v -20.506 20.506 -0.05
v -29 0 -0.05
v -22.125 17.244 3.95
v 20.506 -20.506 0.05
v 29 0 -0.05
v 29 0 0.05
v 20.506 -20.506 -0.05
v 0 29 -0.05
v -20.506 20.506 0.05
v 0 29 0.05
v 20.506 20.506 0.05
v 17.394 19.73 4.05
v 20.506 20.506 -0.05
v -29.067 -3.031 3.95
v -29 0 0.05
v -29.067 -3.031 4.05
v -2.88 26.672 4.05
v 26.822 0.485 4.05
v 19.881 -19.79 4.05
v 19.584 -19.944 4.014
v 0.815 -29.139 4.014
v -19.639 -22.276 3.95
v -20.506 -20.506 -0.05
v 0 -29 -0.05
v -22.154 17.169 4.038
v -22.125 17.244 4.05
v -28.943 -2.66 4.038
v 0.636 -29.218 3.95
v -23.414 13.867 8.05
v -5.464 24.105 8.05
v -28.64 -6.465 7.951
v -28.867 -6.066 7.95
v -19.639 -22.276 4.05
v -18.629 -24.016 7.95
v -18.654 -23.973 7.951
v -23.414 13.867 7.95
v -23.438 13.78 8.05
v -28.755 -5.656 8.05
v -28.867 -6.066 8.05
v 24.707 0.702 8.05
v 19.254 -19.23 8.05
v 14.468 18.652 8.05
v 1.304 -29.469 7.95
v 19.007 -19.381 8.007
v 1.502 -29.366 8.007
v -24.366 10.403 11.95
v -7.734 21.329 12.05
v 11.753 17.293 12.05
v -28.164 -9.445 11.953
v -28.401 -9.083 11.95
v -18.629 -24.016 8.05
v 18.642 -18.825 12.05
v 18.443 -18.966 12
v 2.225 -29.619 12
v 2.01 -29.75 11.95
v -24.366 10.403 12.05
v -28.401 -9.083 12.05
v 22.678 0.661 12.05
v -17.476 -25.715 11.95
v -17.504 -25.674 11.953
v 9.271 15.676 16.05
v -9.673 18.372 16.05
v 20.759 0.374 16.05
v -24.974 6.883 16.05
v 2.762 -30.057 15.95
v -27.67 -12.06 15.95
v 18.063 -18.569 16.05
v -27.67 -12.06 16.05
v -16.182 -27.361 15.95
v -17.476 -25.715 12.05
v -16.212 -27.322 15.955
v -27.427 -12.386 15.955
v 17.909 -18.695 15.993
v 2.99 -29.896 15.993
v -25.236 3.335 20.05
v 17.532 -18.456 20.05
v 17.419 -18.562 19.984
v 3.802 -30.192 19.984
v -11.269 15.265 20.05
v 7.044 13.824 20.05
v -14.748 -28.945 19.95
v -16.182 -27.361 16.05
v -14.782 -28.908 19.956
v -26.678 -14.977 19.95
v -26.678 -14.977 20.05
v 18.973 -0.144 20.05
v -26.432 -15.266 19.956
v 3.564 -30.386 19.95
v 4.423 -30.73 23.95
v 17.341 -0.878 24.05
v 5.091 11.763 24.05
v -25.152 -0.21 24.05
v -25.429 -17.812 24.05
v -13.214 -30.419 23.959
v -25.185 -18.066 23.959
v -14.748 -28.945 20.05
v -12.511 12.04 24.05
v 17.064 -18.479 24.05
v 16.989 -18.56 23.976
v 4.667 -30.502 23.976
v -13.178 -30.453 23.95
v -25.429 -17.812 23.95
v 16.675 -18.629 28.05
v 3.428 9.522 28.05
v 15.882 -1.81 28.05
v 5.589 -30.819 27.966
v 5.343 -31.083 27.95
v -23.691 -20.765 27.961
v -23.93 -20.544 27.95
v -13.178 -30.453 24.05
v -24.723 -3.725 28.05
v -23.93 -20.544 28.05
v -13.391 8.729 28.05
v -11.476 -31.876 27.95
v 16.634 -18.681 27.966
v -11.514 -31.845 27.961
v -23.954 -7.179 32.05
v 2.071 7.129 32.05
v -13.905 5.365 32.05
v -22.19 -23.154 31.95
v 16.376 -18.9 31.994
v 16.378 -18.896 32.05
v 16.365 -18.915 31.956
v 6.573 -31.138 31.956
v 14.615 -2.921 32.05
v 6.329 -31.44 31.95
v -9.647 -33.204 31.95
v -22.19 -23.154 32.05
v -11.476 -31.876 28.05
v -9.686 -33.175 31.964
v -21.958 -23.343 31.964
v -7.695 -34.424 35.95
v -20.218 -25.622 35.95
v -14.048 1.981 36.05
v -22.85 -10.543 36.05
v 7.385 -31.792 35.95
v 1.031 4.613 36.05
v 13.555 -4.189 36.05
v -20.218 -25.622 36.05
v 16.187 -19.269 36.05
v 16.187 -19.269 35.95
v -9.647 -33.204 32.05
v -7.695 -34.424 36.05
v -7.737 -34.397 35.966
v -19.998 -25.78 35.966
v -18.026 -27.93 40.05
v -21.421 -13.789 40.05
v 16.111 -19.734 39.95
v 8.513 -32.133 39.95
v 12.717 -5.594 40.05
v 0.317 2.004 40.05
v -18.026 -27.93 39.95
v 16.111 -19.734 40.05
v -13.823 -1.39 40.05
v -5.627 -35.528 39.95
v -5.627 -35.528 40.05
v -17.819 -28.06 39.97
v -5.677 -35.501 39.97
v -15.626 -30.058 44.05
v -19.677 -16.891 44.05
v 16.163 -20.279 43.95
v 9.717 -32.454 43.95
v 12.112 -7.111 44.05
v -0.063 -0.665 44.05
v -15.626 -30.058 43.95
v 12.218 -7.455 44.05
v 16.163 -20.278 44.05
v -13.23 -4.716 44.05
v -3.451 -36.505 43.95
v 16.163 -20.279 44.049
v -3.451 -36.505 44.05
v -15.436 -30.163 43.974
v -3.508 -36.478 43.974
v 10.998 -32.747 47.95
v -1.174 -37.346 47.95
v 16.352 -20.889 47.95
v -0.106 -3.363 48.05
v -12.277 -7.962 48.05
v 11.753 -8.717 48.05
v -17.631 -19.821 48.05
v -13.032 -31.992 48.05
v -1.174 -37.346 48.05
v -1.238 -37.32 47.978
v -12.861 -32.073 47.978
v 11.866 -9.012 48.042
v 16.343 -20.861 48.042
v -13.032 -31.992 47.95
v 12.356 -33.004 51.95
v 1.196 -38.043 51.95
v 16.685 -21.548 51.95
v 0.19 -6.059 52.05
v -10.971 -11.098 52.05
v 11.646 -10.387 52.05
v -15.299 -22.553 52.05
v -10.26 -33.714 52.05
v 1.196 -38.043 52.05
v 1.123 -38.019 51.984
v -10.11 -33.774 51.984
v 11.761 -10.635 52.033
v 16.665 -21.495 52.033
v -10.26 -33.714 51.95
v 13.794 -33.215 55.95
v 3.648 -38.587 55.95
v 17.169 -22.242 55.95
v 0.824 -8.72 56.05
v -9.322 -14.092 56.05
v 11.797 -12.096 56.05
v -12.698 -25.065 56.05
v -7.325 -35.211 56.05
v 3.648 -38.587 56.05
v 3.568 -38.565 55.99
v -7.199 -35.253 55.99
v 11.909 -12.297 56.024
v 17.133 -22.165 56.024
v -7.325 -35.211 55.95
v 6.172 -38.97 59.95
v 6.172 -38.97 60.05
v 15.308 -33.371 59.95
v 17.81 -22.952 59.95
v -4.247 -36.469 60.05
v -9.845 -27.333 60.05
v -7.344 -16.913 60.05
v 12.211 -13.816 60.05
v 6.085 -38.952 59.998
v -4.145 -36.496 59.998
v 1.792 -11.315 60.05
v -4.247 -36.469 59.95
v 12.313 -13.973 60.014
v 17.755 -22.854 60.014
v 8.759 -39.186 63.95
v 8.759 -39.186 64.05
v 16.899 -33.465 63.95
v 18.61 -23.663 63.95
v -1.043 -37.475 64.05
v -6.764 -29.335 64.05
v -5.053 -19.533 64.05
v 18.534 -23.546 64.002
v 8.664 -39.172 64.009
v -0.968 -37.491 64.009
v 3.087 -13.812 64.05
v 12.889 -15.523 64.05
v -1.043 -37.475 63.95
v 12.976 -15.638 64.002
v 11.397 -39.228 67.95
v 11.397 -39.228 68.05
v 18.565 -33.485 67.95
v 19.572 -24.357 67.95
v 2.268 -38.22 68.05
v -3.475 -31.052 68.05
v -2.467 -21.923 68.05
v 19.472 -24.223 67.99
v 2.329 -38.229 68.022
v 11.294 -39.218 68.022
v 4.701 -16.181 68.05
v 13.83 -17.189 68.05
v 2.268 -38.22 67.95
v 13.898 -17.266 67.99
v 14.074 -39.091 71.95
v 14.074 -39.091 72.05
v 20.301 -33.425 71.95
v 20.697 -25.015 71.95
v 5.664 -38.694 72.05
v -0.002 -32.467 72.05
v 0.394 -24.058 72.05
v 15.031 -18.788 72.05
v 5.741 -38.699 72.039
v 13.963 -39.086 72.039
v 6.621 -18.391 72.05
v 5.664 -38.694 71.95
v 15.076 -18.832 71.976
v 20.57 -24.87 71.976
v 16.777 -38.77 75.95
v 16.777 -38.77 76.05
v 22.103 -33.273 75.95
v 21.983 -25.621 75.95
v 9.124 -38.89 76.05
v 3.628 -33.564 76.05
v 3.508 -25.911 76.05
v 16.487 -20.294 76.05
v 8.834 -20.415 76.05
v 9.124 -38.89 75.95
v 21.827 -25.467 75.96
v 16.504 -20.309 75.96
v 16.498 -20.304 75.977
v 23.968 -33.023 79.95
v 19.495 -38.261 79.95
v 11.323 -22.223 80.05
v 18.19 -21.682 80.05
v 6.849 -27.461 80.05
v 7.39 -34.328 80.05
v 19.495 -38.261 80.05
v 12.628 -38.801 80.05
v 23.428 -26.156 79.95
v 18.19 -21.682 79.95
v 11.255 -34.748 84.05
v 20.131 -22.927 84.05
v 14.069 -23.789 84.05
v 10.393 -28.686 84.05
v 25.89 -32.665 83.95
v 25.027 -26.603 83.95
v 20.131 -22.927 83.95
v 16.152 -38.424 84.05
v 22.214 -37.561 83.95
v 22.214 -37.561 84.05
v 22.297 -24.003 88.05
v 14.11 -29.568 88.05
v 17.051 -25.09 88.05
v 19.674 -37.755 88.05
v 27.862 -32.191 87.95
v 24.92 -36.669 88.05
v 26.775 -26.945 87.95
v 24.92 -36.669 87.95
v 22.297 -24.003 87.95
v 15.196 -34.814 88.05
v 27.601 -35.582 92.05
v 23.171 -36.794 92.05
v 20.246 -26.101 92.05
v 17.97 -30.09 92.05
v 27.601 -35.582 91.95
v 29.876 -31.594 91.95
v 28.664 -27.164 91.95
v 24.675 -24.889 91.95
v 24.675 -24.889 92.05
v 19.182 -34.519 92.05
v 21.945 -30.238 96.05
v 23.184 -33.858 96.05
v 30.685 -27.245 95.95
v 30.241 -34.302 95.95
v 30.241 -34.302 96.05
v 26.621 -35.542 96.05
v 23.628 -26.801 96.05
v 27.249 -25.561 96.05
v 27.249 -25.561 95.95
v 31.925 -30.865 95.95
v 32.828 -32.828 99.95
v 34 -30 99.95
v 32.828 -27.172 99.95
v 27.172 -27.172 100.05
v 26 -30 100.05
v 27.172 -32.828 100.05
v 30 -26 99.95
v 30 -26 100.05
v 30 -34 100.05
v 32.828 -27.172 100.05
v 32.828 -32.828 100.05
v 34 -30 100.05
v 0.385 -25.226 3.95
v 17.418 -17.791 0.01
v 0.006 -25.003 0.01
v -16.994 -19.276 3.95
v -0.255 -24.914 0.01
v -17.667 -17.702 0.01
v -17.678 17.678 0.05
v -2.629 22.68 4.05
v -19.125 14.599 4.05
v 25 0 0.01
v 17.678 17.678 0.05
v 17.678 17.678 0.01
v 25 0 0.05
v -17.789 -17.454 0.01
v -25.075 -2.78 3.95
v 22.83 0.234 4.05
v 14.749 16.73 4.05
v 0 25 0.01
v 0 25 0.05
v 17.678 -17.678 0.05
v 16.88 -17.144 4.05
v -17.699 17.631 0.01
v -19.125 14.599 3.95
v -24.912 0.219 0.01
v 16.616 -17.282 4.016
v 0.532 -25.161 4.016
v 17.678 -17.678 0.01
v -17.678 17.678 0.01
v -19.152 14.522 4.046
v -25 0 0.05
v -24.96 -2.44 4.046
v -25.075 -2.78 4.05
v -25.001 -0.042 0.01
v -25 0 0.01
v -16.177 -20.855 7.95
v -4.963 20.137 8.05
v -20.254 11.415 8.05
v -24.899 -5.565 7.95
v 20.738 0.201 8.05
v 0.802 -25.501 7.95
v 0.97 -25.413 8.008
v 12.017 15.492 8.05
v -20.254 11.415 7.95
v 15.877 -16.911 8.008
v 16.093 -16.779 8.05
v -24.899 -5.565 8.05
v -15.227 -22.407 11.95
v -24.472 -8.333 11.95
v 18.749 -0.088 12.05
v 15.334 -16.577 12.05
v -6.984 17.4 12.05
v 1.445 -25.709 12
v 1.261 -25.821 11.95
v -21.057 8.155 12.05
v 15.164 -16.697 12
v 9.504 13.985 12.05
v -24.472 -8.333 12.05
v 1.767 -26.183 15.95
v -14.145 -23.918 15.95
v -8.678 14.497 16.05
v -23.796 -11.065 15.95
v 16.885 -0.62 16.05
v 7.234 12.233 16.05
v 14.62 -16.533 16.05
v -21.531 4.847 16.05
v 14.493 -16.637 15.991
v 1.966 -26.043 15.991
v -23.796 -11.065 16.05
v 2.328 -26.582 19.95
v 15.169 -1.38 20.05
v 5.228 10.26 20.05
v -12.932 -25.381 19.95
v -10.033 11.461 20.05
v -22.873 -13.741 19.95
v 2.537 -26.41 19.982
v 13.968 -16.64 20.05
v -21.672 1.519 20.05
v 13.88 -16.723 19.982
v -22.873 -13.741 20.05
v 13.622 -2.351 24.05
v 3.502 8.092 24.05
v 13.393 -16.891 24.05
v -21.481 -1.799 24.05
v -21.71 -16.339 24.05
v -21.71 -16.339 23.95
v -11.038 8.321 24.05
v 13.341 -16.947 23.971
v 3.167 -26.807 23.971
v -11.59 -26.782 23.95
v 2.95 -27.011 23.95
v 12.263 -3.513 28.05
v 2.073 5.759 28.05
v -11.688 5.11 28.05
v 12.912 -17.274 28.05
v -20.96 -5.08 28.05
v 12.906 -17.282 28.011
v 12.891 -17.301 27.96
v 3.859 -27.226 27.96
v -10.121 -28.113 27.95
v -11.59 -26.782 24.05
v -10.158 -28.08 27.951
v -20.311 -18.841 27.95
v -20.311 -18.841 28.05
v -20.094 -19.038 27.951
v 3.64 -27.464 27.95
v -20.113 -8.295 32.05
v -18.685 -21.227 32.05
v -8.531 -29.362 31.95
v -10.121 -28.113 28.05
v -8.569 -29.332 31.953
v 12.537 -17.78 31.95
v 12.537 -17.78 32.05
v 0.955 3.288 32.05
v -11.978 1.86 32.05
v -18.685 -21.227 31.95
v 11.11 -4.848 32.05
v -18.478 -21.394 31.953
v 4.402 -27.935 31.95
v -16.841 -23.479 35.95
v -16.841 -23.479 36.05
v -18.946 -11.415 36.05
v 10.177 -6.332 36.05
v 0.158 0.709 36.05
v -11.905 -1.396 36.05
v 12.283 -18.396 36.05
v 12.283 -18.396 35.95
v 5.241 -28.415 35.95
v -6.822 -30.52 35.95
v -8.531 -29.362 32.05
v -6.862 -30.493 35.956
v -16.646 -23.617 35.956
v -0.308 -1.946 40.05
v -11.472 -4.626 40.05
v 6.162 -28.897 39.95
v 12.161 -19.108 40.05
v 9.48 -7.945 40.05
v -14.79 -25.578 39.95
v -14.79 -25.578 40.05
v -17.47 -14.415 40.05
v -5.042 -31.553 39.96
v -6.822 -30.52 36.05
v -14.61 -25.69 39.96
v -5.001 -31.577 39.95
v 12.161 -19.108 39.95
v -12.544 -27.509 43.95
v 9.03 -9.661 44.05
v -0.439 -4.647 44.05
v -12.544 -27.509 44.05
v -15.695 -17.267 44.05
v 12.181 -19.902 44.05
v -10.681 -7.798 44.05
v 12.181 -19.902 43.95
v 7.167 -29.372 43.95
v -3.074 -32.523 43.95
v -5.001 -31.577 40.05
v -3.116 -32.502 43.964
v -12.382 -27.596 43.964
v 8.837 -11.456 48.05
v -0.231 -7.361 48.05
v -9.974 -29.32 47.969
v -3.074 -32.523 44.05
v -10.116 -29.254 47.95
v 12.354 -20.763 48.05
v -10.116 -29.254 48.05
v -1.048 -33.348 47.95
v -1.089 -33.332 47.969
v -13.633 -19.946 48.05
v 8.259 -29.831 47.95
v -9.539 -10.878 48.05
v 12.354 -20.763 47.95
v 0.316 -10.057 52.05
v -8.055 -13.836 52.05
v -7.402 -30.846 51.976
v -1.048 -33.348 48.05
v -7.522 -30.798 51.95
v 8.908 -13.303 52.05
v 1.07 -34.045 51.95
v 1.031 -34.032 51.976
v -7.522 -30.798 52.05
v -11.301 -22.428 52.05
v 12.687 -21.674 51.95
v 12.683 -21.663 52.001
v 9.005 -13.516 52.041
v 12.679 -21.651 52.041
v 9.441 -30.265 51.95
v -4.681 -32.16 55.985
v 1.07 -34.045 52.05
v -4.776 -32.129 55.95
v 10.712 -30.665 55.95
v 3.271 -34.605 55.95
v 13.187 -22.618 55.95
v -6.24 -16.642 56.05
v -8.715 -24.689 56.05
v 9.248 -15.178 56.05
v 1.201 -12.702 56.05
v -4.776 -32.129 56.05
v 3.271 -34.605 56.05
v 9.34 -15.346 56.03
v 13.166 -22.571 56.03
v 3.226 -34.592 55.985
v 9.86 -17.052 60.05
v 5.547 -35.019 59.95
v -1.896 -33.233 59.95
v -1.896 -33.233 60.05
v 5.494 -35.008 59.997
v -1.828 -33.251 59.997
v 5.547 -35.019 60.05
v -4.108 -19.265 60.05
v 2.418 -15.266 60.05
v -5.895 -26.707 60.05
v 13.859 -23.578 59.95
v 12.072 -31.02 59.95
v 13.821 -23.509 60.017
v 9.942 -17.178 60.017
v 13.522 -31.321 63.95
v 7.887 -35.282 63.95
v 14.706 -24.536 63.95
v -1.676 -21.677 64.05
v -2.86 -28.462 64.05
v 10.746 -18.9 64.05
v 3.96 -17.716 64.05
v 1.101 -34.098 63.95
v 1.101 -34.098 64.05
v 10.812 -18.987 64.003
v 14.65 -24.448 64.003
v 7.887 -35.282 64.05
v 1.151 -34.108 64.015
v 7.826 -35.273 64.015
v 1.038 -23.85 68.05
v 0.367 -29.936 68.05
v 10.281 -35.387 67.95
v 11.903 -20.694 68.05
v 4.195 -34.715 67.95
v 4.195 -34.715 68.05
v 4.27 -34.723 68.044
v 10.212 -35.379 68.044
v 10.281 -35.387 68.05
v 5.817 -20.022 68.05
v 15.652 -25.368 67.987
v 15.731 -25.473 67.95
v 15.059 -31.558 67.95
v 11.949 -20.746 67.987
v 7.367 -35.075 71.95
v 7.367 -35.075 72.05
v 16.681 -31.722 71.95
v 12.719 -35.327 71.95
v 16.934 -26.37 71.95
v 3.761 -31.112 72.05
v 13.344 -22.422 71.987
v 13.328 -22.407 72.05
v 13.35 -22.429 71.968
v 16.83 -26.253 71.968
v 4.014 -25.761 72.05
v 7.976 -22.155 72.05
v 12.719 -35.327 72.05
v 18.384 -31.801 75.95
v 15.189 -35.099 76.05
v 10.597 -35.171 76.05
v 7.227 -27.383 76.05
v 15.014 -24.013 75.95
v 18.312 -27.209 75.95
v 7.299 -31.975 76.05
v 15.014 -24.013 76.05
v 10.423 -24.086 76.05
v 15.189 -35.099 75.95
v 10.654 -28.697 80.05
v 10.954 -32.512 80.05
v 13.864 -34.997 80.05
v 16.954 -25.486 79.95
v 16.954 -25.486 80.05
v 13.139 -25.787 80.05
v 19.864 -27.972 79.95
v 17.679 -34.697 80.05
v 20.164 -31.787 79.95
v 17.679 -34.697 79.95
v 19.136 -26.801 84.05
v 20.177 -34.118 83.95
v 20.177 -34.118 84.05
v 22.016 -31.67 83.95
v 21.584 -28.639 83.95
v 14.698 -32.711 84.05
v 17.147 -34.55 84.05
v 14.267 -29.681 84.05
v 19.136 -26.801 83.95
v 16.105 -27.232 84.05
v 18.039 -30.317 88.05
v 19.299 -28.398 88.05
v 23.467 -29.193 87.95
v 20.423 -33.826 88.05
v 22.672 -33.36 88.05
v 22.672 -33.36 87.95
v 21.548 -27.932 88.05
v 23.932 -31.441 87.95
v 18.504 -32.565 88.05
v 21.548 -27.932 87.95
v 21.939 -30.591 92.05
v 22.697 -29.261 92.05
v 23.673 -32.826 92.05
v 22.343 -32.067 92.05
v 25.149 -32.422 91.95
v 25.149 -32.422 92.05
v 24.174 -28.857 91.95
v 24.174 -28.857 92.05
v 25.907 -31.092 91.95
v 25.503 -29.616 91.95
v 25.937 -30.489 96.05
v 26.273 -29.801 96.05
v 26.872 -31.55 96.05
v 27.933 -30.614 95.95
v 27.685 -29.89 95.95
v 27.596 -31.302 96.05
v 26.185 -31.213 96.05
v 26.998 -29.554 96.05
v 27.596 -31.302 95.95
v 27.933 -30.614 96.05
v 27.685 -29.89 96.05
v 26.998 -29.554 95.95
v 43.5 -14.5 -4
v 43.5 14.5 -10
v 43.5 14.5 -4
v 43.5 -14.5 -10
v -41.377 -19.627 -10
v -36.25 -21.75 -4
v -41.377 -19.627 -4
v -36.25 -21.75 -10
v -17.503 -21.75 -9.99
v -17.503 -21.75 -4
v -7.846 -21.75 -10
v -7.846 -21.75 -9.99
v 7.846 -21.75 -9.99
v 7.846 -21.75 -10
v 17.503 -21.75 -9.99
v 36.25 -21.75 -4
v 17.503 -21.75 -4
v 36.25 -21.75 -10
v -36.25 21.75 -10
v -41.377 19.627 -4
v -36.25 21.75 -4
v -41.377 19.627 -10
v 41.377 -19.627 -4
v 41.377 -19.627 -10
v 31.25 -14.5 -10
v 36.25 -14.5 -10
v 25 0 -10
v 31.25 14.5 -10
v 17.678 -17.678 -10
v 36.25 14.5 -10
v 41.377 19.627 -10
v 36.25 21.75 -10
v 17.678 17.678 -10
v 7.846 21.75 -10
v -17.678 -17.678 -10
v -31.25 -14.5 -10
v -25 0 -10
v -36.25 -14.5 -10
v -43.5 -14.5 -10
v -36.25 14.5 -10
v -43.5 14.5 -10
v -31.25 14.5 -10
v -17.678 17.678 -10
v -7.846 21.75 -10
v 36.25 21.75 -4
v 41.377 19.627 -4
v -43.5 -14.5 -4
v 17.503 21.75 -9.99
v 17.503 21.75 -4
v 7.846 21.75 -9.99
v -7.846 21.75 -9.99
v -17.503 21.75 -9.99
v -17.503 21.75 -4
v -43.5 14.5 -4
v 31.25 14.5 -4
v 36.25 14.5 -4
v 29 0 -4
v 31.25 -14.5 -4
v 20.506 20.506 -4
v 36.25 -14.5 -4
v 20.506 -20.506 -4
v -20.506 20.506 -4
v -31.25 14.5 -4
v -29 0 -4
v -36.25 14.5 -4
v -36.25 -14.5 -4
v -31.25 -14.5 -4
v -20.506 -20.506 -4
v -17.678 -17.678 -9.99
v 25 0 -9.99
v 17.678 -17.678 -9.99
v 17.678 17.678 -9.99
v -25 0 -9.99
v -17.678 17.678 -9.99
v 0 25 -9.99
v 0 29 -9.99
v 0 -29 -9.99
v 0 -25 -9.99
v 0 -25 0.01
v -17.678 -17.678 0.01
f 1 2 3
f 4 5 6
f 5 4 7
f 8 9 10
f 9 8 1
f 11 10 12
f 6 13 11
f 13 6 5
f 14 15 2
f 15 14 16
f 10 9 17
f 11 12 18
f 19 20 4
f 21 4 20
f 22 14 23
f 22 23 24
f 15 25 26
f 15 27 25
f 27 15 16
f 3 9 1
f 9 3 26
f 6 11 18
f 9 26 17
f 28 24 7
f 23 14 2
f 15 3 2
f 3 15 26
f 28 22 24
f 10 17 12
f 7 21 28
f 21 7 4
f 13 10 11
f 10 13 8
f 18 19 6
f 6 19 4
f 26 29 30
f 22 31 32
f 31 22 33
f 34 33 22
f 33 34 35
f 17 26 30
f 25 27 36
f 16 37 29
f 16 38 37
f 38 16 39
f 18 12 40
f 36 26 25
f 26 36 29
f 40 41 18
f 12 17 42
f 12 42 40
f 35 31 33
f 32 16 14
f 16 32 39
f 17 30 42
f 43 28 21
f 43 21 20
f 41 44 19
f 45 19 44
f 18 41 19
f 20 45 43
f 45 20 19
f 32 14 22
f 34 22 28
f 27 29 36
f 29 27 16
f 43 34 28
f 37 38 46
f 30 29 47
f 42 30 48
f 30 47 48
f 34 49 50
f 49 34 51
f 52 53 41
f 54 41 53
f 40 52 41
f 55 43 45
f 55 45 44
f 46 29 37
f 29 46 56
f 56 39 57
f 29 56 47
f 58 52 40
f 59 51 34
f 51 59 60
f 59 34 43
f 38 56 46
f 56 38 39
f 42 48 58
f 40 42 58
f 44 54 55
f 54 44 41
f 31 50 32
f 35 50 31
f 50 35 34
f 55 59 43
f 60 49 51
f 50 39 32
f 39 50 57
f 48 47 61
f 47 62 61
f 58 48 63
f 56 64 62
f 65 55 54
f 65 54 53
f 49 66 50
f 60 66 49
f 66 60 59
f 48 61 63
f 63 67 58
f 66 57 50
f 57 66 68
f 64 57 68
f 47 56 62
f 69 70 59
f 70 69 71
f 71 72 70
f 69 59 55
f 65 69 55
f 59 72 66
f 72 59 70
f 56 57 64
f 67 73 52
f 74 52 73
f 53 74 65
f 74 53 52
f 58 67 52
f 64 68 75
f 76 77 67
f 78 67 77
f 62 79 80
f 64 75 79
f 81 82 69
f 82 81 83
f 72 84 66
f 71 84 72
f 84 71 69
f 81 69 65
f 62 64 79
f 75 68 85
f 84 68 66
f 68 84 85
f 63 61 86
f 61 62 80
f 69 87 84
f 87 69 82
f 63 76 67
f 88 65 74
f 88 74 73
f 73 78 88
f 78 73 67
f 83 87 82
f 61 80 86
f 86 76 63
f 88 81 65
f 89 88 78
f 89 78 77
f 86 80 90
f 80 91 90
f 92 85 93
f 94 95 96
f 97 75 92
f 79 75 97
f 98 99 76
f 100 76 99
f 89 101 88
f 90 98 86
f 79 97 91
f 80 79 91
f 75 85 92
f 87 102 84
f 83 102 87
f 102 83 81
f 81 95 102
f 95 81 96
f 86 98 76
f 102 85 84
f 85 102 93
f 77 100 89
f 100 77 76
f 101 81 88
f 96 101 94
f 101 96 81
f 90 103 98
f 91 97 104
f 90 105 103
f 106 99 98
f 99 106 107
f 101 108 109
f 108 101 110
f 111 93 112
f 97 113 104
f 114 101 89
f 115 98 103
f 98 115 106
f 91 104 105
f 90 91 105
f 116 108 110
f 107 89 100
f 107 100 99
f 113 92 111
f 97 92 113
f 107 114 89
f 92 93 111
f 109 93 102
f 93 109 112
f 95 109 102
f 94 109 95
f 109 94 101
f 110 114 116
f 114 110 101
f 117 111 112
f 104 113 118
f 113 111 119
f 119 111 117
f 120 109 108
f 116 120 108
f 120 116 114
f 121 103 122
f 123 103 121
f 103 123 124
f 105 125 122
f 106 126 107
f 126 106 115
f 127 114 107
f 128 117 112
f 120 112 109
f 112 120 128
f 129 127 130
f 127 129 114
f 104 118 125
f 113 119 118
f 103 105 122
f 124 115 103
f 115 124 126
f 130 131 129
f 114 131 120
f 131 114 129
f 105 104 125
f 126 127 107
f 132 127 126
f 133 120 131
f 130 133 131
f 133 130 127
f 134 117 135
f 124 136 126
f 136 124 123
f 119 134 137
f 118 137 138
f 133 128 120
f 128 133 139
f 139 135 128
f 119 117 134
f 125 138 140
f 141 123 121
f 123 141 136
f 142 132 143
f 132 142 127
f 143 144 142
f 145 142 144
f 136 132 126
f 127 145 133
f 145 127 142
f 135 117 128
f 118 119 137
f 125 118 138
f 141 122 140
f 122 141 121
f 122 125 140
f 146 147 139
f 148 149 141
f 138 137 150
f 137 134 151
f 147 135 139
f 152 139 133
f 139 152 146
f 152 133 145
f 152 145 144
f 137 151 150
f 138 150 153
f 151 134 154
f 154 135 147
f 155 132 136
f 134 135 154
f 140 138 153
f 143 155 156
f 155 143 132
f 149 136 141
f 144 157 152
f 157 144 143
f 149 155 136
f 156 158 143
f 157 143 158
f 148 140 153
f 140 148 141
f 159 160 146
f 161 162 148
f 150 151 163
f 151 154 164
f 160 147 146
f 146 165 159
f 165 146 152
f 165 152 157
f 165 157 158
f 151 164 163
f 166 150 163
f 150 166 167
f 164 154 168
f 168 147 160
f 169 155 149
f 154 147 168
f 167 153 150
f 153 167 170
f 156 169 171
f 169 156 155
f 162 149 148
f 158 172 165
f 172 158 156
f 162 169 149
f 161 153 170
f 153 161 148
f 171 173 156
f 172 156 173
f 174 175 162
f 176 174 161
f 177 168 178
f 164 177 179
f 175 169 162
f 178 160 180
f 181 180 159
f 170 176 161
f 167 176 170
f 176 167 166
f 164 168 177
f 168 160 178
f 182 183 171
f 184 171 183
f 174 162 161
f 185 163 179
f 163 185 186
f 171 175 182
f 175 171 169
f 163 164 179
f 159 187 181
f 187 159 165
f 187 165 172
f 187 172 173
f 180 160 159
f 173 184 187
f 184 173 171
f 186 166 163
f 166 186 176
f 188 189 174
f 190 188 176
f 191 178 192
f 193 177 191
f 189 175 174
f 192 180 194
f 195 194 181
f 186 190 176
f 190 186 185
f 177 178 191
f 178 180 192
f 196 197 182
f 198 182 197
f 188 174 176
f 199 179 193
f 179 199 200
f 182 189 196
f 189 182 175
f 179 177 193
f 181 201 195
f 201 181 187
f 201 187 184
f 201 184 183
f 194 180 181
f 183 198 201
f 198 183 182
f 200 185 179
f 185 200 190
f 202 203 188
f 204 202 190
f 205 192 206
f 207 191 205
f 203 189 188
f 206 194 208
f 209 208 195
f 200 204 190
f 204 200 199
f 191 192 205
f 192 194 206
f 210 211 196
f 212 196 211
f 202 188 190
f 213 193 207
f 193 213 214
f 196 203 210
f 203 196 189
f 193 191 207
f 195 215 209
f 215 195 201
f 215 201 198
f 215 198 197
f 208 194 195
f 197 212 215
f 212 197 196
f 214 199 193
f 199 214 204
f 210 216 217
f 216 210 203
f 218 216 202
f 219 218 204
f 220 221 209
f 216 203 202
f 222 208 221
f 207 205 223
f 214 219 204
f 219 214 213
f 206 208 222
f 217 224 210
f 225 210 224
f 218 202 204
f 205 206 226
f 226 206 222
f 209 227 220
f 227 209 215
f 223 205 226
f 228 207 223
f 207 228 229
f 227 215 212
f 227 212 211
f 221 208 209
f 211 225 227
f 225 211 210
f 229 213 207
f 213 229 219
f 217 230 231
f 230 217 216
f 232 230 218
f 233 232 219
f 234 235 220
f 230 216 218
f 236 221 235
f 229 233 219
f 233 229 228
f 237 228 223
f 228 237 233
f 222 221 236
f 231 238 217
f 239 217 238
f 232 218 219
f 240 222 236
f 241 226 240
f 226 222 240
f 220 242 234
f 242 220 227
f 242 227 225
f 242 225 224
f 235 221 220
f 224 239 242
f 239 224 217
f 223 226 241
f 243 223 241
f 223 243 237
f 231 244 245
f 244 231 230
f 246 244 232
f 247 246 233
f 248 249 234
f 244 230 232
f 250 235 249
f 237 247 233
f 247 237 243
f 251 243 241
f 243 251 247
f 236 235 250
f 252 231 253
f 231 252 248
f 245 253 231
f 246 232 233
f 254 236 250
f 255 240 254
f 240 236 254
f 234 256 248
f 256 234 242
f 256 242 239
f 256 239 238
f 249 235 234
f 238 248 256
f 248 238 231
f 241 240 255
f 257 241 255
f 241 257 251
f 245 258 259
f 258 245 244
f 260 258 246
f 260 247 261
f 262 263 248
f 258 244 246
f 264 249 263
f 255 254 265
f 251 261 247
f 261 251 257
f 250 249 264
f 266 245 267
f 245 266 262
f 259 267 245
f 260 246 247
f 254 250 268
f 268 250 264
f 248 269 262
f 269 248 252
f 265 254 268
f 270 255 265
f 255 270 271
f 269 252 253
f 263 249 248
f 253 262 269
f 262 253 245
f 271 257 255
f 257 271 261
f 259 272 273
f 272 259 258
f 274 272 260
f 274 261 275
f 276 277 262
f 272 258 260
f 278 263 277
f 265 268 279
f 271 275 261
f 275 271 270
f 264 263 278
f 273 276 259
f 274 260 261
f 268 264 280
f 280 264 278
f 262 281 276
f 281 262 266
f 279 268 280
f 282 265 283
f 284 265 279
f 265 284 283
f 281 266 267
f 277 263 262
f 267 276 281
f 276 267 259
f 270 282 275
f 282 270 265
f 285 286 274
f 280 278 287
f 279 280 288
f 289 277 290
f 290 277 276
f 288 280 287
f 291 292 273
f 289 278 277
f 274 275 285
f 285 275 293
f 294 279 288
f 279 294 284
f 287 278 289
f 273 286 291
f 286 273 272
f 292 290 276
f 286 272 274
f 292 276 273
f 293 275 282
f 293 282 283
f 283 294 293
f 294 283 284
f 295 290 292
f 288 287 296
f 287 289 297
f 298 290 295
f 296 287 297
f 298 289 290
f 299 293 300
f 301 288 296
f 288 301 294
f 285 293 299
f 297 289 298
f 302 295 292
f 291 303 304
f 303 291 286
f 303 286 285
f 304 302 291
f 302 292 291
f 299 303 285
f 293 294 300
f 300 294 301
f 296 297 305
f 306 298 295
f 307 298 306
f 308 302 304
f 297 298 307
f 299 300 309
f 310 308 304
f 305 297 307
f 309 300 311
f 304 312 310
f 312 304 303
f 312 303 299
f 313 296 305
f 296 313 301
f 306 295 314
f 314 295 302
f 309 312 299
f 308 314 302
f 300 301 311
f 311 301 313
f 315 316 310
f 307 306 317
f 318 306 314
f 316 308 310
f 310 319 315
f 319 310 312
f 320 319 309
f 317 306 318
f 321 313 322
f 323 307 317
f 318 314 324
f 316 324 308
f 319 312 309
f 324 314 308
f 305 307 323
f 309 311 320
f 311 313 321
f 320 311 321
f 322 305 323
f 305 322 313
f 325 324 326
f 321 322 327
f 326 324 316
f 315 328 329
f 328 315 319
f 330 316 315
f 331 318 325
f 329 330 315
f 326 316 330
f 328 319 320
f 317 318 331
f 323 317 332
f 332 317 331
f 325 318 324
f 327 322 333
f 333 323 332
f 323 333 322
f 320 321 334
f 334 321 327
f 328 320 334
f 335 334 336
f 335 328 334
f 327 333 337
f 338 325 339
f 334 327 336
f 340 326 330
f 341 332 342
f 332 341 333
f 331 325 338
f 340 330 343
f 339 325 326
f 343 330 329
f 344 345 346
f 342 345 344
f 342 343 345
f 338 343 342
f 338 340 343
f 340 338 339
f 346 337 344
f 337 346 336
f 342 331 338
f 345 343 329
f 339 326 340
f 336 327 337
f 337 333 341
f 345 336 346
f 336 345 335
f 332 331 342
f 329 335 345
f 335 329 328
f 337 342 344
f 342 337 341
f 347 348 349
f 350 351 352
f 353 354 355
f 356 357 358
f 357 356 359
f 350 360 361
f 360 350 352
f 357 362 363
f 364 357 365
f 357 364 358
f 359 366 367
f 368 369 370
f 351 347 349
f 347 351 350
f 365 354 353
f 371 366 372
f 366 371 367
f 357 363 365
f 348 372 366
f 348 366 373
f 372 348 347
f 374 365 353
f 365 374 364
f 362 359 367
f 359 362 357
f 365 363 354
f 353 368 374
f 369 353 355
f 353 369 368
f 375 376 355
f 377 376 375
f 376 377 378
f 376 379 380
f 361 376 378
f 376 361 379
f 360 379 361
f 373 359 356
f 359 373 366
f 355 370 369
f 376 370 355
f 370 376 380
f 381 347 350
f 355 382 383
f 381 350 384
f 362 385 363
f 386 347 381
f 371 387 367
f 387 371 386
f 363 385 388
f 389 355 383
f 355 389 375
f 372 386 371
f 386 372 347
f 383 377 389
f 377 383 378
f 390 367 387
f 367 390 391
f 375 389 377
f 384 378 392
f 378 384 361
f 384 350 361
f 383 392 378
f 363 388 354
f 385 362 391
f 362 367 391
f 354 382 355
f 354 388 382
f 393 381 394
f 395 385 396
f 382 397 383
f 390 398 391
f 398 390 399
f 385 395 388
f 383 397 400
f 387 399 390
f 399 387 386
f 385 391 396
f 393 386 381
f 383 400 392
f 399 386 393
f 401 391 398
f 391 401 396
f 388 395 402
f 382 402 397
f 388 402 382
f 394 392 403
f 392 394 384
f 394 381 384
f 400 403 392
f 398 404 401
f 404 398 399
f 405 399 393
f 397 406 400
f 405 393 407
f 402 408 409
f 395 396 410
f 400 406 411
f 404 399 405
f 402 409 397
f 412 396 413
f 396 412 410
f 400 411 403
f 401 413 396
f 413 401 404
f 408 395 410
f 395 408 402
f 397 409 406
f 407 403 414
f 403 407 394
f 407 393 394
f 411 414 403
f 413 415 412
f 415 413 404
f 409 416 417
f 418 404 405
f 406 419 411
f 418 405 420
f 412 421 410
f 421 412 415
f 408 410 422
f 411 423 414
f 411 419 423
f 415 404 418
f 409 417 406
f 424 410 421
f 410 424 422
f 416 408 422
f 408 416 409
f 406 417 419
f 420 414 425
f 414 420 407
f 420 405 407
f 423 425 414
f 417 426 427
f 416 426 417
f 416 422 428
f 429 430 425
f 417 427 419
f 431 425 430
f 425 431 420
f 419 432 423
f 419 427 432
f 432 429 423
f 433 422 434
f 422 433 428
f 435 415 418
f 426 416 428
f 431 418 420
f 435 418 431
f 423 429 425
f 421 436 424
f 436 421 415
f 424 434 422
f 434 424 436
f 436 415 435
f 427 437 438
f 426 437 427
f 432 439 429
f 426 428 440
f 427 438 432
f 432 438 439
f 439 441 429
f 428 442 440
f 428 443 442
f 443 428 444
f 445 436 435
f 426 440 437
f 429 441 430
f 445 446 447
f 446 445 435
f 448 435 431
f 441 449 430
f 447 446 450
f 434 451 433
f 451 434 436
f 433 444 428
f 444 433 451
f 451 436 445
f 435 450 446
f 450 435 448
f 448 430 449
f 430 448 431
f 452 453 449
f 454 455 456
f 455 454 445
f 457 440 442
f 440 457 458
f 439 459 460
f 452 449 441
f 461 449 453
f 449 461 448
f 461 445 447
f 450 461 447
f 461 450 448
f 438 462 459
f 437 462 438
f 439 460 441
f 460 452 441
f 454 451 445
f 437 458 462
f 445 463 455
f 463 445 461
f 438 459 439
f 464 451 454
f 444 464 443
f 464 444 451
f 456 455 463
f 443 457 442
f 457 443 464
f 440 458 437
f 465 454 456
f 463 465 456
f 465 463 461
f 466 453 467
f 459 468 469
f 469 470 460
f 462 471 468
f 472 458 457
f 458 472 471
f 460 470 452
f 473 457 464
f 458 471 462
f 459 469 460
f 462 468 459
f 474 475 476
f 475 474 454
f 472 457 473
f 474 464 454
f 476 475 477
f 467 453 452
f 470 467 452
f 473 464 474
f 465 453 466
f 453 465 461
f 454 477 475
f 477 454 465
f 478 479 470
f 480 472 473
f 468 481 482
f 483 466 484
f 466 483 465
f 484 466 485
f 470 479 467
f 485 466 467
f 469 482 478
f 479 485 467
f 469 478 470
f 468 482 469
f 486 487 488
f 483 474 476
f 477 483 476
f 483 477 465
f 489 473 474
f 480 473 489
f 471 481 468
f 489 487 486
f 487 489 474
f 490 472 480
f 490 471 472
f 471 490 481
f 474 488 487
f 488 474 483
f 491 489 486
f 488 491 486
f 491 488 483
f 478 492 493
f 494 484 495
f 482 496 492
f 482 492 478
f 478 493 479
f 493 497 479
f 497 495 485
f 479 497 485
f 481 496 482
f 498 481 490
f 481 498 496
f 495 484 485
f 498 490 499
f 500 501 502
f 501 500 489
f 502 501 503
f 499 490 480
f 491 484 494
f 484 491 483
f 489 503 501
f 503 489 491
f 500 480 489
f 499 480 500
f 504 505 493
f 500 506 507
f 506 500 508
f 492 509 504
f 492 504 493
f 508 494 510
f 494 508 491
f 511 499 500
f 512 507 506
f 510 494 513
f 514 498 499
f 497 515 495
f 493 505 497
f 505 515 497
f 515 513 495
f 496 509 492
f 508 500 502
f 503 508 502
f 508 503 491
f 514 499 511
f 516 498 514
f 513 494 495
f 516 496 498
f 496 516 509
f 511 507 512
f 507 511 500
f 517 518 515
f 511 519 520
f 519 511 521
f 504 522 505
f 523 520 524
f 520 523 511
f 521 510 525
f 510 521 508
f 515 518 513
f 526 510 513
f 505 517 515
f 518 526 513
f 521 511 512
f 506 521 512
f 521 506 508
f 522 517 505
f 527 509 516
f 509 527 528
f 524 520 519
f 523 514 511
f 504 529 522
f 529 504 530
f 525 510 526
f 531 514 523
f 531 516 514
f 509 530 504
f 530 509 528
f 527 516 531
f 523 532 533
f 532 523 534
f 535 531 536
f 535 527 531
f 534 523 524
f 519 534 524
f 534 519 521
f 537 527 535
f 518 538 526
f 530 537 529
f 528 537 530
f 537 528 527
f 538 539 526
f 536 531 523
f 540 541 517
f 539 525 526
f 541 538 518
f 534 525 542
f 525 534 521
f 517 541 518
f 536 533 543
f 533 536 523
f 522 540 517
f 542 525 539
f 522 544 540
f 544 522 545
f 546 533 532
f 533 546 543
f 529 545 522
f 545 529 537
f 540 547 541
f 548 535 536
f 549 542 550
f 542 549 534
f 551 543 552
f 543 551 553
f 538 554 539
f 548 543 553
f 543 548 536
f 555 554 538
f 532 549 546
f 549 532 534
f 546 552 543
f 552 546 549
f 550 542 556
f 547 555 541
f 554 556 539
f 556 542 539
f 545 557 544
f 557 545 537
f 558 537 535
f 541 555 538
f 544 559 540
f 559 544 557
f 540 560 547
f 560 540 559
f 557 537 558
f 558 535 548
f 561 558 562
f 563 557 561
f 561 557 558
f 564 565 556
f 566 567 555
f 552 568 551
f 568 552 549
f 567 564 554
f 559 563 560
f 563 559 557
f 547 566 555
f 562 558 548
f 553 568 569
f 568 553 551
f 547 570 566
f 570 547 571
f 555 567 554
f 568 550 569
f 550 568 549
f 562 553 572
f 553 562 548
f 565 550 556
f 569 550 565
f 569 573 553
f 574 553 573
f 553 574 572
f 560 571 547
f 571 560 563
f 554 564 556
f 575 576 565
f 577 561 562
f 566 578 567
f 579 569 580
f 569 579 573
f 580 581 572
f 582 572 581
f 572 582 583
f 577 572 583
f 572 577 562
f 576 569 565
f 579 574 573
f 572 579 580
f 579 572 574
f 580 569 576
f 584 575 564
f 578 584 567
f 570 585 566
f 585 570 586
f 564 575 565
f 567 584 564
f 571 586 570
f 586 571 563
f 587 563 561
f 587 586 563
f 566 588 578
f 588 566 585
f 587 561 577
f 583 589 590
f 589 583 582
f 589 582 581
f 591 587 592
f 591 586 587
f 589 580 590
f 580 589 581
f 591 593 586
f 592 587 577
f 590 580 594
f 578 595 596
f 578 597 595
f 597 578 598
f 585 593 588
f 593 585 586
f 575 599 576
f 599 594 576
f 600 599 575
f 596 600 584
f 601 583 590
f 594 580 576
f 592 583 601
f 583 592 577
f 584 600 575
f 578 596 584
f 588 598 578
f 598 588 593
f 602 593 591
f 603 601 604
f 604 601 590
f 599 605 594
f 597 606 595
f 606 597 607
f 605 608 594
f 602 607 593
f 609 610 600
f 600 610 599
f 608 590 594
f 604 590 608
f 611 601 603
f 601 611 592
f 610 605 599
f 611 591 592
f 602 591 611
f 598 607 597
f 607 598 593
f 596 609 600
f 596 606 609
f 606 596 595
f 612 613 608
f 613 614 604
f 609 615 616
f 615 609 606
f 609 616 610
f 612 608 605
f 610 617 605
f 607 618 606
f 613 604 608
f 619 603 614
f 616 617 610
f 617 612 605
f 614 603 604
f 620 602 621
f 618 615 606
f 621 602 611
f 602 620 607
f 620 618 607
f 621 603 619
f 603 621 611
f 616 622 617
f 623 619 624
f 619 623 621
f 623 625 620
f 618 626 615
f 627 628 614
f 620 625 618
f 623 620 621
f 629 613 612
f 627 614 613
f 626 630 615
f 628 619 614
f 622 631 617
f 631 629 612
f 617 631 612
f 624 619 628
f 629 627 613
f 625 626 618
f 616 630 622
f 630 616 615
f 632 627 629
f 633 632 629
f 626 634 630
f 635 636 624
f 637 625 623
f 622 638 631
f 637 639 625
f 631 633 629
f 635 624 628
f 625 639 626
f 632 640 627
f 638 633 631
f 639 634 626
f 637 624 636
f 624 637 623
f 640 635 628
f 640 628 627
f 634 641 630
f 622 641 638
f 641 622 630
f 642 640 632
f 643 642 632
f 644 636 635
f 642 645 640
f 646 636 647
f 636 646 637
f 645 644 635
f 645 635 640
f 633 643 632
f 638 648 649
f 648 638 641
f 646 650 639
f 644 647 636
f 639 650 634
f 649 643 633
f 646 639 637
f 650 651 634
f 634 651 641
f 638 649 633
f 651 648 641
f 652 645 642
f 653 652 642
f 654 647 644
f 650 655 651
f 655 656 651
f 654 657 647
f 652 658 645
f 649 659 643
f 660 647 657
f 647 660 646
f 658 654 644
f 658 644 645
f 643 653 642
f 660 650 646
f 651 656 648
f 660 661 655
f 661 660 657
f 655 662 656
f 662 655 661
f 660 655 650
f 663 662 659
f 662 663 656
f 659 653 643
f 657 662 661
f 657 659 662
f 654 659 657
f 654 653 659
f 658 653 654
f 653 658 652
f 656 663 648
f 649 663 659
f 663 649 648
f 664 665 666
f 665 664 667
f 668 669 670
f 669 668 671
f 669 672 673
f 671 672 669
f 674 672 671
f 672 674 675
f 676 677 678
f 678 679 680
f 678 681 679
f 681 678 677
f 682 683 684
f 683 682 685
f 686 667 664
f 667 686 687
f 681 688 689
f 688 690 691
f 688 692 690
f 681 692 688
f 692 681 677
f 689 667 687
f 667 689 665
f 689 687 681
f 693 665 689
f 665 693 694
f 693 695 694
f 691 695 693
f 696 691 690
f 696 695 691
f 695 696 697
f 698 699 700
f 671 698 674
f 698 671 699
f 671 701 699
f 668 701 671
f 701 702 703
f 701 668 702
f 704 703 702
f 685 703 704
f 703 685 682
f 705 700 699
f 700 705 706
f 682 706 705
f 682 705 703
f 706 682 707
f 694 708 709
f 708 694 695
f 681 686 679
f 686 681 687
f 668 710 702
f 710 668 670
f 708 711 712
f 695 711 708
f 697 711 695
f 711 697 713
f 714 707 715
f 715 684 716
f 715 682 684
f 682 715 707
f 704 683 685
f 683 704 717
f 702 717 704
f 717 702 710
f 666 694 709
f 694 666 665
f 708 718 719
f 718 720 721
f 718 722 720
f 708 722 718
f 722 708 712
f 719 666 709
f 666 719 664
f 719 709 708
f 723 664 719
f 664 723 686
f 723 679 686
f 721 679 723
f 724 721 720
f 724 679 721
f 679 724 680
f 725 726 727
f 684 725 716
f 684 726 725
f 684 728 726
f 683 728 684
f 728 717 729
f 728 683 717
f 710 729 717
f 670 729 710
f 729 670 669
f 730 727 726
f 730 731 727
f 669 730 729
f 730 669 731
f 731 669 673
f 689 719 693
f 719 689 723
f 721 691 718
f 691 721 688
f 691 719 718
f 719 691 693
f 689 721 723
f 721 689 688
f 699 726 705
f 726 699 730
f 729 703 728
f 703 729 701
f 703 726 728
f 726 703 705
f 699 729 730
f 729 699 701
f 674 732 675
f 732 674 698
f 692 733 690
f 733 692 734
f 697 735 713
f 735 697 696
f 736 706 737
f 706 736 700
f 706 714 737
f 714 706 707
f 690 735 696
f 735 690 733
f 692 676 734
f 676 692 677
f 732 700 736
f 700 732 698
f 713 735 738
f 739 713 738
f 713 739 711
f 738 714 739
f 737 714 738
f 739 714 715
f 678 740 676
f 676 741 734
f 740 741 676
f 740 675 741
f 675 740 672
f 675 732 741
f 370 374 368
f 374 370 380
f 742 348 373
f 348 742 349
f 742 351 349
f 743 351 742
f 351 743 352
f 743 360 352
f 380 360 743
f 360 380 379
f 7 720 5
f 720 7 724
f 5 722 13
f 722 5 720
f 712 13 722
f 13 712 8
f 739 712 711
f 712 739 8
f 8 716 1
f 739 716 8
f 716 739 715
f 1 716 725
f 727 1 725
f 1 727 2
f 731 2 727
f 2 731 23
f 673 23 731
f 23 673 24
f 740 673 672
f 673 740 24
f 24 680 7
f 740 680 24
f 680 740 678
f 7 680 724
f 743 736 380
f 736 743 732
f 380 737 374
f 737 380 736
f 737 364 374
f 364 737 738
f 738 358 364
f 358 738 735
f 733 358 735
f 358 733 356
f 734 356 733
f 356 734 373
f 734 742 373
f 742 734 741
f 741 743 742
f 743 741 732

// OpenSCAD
//	   Customizable Horn with TAB and constant wall thickness
//		    Steven Veltema
//		    September 18, 2015
//
//      With inspiration from:
//	    Customizable Horn - Steve Medwin
//      http://www.thingiverse.com/thing:347425
//
//      And Adafruit LED Fire Horns
//      http://www.thingiverse.com/thing:344412

//higher = smoother, larger files
HORN_FACE_NUMBER = 8; //[6:1:100]

HORN_LENGTH=100.0;// [10:5:300]
//base inner radius
HORN_INNER_RADIUS=25.0;// [10:1:100]
//constant across horn height
HORN_WALL_THICKNESS=4.0;//	[1:1:50]

HORN_TWIST_X_AXIS=0;// [-720:5:720]
HORN_TWIST_Y_AXIS=0; // [-720:5:720]
HORN_TWIST_Z_AXIS=90;// [-720:5:720]

HORN_TIP_OFFSET_X=-30.0;// [-100:5:100]
HORN_TIP_OFFSET_Y=-30.0;// [-100:5:100]
HORN_ROTATE = 0.0;// [0:5:360]

//lower = more detailed, larger files
HORN_VERT_RESOLUTION = 4.0;//[2:1:10]

BASE_HEIGHT = 10.0; // [2:1:100]

INCLUDE_TAB = "true"; // [true,false]
TAB_HEIGHT = 5; // [2:1:10]
TAB_ROTATE = 0.0;// [0:5:360]

$fn = HORN_FACE_NUMBER;

union() {
    horn();
    base();
    if (INCLUDE_TAB != "false") {
        rotate([0,0,TAB_ROTATE]) TAB();
    }
}


module ring(inner_rad, height){
    linear_extrude(height = height, center = false){
        difference() {
            circle(r = inner_rad+HORN_WALL_THICKNESS);
            circle(r = inner_rad);
        }
    }
}
 
module base() {
    translate([0,0,-BASE_HEIGHT+0.01])  rotate([0,0,HORN_ROTATE]) ring(HORN_INNER_RADIUS,BASE_HEIGHT);
}

module TAB() {
    shortSide = HORN_INNER_RADIUS+HORN_WALL_THICKNESS;
    longSide = shortSide*2.5;
    height          = TAB_HEIGHT;
    TABHoleDepth = TAB_HEIGHT;
    
    difference() {
       translate([-longSide/2,-shortSide/2,-BASE_HEIGHT]){
            minkowski() {
                cube(size=[longSide,shortSide,height]);
                cylinder(r=shortSide/4);
            }
         }
      
        translate([longSide-longSide/2-TABHoleDepth,-shortSide/2,-height-BASE_HEIGHT]) cube(size=[TABHoleDepth,shortSide,height*4]);
        translate([-longSide/2,-shortSide/2,-height-BASE_HEIGHT]) cube(size=[TABHoleDepth,shortSide,height*4]);

        rotate([0,180,0]) translate([0,0,-height]) cylinder(h=height*3,r=HORN_INNER_RADIUS);
    }
}

module horn()
{
    fn=floor(HORN_LENGTH/HORN_VERT_RESOLUTION);
        
    twistX = HORN_TWIST_X_AXIS/fn;
    twistY = HORN_TWIST_Y_AXIS/fn;
    twistZ = HORN_TWIST_Z_AXIS/fn;
    
    offsetX = HORN_TIP_OFFSET_X/fn;
    offsetY = HORN_TIP_OFFSET_Y/fn;
    offsetZ = HORN_LENGTH/fn;
    
    rotate([0,0,HORN_ROTATE]) {    
       difference() {
           //outershell
            for (i=[0:fn-1]) {                
                hull() { 
                    rotate([twistX*i,twistY*i,twistZ*i])
                        translate([offsetX*i,offsetY*i,offsetZ*i])
                            linear_extrude(height = 0.1, center = true, convexity = 10, twist = 0)
                                circle(HORN_INNER_RADIUS+HORN_WALL_THICKNESS-(i*(HORN_INNER_RADIUS)/fn));
          
                    rotate([twistX*(i+1),twistY*(i+1),twistZ*(i+1)])
                        translate([offsetX*(i+1),offsetY*(i+1),offsetZ*(i+1)])
                            linear_extrude(height = 0.1, center = true, convexity = 10, twist = 0)
                                circle(HORN_INNER_RADIUS+HORN_WALL_THICKNESS-((i+1)*(HORN_INNER_RADIUS)/fn));                   
                 }
            }
           //innershell
             for (i=[0:fn-1]) {                
                hull() { 
                    lowerOffsetZ = offsetZ*i;
                    if (i==0) {lowerOffsetZ = lowerOffsetZ - 0.1;} //make sure base hole is properly removed
                    rotate([twistX*i,twistY*i,twistZ*i])
                        translate([offsetX*i,offsetY*i,lowerOffsetZ])
                            linear_extrude(height = 0.1, center = true, convexity = 10, twist = 0)
                                circle(HORN_INNER_RADIUS-(i*(HORN_INNER_RADIUS)/fn));
          
                    rotate([twistX*(i+1),twistY*(i+1),twistZ*(i+1)])
                        translate([offsetX*(i+1),offsetY*(i+1),offsetZ*(i+1)])
                            linear_extrude(height = 0.1, center = true, convexity = 10, twist = 0)
                                circle(HORN_INNER_RADIUS-((i+1)*(HORN_INNER_RADIUS)/fn));

                }
            }
        } //diff
    } //rotate
}
